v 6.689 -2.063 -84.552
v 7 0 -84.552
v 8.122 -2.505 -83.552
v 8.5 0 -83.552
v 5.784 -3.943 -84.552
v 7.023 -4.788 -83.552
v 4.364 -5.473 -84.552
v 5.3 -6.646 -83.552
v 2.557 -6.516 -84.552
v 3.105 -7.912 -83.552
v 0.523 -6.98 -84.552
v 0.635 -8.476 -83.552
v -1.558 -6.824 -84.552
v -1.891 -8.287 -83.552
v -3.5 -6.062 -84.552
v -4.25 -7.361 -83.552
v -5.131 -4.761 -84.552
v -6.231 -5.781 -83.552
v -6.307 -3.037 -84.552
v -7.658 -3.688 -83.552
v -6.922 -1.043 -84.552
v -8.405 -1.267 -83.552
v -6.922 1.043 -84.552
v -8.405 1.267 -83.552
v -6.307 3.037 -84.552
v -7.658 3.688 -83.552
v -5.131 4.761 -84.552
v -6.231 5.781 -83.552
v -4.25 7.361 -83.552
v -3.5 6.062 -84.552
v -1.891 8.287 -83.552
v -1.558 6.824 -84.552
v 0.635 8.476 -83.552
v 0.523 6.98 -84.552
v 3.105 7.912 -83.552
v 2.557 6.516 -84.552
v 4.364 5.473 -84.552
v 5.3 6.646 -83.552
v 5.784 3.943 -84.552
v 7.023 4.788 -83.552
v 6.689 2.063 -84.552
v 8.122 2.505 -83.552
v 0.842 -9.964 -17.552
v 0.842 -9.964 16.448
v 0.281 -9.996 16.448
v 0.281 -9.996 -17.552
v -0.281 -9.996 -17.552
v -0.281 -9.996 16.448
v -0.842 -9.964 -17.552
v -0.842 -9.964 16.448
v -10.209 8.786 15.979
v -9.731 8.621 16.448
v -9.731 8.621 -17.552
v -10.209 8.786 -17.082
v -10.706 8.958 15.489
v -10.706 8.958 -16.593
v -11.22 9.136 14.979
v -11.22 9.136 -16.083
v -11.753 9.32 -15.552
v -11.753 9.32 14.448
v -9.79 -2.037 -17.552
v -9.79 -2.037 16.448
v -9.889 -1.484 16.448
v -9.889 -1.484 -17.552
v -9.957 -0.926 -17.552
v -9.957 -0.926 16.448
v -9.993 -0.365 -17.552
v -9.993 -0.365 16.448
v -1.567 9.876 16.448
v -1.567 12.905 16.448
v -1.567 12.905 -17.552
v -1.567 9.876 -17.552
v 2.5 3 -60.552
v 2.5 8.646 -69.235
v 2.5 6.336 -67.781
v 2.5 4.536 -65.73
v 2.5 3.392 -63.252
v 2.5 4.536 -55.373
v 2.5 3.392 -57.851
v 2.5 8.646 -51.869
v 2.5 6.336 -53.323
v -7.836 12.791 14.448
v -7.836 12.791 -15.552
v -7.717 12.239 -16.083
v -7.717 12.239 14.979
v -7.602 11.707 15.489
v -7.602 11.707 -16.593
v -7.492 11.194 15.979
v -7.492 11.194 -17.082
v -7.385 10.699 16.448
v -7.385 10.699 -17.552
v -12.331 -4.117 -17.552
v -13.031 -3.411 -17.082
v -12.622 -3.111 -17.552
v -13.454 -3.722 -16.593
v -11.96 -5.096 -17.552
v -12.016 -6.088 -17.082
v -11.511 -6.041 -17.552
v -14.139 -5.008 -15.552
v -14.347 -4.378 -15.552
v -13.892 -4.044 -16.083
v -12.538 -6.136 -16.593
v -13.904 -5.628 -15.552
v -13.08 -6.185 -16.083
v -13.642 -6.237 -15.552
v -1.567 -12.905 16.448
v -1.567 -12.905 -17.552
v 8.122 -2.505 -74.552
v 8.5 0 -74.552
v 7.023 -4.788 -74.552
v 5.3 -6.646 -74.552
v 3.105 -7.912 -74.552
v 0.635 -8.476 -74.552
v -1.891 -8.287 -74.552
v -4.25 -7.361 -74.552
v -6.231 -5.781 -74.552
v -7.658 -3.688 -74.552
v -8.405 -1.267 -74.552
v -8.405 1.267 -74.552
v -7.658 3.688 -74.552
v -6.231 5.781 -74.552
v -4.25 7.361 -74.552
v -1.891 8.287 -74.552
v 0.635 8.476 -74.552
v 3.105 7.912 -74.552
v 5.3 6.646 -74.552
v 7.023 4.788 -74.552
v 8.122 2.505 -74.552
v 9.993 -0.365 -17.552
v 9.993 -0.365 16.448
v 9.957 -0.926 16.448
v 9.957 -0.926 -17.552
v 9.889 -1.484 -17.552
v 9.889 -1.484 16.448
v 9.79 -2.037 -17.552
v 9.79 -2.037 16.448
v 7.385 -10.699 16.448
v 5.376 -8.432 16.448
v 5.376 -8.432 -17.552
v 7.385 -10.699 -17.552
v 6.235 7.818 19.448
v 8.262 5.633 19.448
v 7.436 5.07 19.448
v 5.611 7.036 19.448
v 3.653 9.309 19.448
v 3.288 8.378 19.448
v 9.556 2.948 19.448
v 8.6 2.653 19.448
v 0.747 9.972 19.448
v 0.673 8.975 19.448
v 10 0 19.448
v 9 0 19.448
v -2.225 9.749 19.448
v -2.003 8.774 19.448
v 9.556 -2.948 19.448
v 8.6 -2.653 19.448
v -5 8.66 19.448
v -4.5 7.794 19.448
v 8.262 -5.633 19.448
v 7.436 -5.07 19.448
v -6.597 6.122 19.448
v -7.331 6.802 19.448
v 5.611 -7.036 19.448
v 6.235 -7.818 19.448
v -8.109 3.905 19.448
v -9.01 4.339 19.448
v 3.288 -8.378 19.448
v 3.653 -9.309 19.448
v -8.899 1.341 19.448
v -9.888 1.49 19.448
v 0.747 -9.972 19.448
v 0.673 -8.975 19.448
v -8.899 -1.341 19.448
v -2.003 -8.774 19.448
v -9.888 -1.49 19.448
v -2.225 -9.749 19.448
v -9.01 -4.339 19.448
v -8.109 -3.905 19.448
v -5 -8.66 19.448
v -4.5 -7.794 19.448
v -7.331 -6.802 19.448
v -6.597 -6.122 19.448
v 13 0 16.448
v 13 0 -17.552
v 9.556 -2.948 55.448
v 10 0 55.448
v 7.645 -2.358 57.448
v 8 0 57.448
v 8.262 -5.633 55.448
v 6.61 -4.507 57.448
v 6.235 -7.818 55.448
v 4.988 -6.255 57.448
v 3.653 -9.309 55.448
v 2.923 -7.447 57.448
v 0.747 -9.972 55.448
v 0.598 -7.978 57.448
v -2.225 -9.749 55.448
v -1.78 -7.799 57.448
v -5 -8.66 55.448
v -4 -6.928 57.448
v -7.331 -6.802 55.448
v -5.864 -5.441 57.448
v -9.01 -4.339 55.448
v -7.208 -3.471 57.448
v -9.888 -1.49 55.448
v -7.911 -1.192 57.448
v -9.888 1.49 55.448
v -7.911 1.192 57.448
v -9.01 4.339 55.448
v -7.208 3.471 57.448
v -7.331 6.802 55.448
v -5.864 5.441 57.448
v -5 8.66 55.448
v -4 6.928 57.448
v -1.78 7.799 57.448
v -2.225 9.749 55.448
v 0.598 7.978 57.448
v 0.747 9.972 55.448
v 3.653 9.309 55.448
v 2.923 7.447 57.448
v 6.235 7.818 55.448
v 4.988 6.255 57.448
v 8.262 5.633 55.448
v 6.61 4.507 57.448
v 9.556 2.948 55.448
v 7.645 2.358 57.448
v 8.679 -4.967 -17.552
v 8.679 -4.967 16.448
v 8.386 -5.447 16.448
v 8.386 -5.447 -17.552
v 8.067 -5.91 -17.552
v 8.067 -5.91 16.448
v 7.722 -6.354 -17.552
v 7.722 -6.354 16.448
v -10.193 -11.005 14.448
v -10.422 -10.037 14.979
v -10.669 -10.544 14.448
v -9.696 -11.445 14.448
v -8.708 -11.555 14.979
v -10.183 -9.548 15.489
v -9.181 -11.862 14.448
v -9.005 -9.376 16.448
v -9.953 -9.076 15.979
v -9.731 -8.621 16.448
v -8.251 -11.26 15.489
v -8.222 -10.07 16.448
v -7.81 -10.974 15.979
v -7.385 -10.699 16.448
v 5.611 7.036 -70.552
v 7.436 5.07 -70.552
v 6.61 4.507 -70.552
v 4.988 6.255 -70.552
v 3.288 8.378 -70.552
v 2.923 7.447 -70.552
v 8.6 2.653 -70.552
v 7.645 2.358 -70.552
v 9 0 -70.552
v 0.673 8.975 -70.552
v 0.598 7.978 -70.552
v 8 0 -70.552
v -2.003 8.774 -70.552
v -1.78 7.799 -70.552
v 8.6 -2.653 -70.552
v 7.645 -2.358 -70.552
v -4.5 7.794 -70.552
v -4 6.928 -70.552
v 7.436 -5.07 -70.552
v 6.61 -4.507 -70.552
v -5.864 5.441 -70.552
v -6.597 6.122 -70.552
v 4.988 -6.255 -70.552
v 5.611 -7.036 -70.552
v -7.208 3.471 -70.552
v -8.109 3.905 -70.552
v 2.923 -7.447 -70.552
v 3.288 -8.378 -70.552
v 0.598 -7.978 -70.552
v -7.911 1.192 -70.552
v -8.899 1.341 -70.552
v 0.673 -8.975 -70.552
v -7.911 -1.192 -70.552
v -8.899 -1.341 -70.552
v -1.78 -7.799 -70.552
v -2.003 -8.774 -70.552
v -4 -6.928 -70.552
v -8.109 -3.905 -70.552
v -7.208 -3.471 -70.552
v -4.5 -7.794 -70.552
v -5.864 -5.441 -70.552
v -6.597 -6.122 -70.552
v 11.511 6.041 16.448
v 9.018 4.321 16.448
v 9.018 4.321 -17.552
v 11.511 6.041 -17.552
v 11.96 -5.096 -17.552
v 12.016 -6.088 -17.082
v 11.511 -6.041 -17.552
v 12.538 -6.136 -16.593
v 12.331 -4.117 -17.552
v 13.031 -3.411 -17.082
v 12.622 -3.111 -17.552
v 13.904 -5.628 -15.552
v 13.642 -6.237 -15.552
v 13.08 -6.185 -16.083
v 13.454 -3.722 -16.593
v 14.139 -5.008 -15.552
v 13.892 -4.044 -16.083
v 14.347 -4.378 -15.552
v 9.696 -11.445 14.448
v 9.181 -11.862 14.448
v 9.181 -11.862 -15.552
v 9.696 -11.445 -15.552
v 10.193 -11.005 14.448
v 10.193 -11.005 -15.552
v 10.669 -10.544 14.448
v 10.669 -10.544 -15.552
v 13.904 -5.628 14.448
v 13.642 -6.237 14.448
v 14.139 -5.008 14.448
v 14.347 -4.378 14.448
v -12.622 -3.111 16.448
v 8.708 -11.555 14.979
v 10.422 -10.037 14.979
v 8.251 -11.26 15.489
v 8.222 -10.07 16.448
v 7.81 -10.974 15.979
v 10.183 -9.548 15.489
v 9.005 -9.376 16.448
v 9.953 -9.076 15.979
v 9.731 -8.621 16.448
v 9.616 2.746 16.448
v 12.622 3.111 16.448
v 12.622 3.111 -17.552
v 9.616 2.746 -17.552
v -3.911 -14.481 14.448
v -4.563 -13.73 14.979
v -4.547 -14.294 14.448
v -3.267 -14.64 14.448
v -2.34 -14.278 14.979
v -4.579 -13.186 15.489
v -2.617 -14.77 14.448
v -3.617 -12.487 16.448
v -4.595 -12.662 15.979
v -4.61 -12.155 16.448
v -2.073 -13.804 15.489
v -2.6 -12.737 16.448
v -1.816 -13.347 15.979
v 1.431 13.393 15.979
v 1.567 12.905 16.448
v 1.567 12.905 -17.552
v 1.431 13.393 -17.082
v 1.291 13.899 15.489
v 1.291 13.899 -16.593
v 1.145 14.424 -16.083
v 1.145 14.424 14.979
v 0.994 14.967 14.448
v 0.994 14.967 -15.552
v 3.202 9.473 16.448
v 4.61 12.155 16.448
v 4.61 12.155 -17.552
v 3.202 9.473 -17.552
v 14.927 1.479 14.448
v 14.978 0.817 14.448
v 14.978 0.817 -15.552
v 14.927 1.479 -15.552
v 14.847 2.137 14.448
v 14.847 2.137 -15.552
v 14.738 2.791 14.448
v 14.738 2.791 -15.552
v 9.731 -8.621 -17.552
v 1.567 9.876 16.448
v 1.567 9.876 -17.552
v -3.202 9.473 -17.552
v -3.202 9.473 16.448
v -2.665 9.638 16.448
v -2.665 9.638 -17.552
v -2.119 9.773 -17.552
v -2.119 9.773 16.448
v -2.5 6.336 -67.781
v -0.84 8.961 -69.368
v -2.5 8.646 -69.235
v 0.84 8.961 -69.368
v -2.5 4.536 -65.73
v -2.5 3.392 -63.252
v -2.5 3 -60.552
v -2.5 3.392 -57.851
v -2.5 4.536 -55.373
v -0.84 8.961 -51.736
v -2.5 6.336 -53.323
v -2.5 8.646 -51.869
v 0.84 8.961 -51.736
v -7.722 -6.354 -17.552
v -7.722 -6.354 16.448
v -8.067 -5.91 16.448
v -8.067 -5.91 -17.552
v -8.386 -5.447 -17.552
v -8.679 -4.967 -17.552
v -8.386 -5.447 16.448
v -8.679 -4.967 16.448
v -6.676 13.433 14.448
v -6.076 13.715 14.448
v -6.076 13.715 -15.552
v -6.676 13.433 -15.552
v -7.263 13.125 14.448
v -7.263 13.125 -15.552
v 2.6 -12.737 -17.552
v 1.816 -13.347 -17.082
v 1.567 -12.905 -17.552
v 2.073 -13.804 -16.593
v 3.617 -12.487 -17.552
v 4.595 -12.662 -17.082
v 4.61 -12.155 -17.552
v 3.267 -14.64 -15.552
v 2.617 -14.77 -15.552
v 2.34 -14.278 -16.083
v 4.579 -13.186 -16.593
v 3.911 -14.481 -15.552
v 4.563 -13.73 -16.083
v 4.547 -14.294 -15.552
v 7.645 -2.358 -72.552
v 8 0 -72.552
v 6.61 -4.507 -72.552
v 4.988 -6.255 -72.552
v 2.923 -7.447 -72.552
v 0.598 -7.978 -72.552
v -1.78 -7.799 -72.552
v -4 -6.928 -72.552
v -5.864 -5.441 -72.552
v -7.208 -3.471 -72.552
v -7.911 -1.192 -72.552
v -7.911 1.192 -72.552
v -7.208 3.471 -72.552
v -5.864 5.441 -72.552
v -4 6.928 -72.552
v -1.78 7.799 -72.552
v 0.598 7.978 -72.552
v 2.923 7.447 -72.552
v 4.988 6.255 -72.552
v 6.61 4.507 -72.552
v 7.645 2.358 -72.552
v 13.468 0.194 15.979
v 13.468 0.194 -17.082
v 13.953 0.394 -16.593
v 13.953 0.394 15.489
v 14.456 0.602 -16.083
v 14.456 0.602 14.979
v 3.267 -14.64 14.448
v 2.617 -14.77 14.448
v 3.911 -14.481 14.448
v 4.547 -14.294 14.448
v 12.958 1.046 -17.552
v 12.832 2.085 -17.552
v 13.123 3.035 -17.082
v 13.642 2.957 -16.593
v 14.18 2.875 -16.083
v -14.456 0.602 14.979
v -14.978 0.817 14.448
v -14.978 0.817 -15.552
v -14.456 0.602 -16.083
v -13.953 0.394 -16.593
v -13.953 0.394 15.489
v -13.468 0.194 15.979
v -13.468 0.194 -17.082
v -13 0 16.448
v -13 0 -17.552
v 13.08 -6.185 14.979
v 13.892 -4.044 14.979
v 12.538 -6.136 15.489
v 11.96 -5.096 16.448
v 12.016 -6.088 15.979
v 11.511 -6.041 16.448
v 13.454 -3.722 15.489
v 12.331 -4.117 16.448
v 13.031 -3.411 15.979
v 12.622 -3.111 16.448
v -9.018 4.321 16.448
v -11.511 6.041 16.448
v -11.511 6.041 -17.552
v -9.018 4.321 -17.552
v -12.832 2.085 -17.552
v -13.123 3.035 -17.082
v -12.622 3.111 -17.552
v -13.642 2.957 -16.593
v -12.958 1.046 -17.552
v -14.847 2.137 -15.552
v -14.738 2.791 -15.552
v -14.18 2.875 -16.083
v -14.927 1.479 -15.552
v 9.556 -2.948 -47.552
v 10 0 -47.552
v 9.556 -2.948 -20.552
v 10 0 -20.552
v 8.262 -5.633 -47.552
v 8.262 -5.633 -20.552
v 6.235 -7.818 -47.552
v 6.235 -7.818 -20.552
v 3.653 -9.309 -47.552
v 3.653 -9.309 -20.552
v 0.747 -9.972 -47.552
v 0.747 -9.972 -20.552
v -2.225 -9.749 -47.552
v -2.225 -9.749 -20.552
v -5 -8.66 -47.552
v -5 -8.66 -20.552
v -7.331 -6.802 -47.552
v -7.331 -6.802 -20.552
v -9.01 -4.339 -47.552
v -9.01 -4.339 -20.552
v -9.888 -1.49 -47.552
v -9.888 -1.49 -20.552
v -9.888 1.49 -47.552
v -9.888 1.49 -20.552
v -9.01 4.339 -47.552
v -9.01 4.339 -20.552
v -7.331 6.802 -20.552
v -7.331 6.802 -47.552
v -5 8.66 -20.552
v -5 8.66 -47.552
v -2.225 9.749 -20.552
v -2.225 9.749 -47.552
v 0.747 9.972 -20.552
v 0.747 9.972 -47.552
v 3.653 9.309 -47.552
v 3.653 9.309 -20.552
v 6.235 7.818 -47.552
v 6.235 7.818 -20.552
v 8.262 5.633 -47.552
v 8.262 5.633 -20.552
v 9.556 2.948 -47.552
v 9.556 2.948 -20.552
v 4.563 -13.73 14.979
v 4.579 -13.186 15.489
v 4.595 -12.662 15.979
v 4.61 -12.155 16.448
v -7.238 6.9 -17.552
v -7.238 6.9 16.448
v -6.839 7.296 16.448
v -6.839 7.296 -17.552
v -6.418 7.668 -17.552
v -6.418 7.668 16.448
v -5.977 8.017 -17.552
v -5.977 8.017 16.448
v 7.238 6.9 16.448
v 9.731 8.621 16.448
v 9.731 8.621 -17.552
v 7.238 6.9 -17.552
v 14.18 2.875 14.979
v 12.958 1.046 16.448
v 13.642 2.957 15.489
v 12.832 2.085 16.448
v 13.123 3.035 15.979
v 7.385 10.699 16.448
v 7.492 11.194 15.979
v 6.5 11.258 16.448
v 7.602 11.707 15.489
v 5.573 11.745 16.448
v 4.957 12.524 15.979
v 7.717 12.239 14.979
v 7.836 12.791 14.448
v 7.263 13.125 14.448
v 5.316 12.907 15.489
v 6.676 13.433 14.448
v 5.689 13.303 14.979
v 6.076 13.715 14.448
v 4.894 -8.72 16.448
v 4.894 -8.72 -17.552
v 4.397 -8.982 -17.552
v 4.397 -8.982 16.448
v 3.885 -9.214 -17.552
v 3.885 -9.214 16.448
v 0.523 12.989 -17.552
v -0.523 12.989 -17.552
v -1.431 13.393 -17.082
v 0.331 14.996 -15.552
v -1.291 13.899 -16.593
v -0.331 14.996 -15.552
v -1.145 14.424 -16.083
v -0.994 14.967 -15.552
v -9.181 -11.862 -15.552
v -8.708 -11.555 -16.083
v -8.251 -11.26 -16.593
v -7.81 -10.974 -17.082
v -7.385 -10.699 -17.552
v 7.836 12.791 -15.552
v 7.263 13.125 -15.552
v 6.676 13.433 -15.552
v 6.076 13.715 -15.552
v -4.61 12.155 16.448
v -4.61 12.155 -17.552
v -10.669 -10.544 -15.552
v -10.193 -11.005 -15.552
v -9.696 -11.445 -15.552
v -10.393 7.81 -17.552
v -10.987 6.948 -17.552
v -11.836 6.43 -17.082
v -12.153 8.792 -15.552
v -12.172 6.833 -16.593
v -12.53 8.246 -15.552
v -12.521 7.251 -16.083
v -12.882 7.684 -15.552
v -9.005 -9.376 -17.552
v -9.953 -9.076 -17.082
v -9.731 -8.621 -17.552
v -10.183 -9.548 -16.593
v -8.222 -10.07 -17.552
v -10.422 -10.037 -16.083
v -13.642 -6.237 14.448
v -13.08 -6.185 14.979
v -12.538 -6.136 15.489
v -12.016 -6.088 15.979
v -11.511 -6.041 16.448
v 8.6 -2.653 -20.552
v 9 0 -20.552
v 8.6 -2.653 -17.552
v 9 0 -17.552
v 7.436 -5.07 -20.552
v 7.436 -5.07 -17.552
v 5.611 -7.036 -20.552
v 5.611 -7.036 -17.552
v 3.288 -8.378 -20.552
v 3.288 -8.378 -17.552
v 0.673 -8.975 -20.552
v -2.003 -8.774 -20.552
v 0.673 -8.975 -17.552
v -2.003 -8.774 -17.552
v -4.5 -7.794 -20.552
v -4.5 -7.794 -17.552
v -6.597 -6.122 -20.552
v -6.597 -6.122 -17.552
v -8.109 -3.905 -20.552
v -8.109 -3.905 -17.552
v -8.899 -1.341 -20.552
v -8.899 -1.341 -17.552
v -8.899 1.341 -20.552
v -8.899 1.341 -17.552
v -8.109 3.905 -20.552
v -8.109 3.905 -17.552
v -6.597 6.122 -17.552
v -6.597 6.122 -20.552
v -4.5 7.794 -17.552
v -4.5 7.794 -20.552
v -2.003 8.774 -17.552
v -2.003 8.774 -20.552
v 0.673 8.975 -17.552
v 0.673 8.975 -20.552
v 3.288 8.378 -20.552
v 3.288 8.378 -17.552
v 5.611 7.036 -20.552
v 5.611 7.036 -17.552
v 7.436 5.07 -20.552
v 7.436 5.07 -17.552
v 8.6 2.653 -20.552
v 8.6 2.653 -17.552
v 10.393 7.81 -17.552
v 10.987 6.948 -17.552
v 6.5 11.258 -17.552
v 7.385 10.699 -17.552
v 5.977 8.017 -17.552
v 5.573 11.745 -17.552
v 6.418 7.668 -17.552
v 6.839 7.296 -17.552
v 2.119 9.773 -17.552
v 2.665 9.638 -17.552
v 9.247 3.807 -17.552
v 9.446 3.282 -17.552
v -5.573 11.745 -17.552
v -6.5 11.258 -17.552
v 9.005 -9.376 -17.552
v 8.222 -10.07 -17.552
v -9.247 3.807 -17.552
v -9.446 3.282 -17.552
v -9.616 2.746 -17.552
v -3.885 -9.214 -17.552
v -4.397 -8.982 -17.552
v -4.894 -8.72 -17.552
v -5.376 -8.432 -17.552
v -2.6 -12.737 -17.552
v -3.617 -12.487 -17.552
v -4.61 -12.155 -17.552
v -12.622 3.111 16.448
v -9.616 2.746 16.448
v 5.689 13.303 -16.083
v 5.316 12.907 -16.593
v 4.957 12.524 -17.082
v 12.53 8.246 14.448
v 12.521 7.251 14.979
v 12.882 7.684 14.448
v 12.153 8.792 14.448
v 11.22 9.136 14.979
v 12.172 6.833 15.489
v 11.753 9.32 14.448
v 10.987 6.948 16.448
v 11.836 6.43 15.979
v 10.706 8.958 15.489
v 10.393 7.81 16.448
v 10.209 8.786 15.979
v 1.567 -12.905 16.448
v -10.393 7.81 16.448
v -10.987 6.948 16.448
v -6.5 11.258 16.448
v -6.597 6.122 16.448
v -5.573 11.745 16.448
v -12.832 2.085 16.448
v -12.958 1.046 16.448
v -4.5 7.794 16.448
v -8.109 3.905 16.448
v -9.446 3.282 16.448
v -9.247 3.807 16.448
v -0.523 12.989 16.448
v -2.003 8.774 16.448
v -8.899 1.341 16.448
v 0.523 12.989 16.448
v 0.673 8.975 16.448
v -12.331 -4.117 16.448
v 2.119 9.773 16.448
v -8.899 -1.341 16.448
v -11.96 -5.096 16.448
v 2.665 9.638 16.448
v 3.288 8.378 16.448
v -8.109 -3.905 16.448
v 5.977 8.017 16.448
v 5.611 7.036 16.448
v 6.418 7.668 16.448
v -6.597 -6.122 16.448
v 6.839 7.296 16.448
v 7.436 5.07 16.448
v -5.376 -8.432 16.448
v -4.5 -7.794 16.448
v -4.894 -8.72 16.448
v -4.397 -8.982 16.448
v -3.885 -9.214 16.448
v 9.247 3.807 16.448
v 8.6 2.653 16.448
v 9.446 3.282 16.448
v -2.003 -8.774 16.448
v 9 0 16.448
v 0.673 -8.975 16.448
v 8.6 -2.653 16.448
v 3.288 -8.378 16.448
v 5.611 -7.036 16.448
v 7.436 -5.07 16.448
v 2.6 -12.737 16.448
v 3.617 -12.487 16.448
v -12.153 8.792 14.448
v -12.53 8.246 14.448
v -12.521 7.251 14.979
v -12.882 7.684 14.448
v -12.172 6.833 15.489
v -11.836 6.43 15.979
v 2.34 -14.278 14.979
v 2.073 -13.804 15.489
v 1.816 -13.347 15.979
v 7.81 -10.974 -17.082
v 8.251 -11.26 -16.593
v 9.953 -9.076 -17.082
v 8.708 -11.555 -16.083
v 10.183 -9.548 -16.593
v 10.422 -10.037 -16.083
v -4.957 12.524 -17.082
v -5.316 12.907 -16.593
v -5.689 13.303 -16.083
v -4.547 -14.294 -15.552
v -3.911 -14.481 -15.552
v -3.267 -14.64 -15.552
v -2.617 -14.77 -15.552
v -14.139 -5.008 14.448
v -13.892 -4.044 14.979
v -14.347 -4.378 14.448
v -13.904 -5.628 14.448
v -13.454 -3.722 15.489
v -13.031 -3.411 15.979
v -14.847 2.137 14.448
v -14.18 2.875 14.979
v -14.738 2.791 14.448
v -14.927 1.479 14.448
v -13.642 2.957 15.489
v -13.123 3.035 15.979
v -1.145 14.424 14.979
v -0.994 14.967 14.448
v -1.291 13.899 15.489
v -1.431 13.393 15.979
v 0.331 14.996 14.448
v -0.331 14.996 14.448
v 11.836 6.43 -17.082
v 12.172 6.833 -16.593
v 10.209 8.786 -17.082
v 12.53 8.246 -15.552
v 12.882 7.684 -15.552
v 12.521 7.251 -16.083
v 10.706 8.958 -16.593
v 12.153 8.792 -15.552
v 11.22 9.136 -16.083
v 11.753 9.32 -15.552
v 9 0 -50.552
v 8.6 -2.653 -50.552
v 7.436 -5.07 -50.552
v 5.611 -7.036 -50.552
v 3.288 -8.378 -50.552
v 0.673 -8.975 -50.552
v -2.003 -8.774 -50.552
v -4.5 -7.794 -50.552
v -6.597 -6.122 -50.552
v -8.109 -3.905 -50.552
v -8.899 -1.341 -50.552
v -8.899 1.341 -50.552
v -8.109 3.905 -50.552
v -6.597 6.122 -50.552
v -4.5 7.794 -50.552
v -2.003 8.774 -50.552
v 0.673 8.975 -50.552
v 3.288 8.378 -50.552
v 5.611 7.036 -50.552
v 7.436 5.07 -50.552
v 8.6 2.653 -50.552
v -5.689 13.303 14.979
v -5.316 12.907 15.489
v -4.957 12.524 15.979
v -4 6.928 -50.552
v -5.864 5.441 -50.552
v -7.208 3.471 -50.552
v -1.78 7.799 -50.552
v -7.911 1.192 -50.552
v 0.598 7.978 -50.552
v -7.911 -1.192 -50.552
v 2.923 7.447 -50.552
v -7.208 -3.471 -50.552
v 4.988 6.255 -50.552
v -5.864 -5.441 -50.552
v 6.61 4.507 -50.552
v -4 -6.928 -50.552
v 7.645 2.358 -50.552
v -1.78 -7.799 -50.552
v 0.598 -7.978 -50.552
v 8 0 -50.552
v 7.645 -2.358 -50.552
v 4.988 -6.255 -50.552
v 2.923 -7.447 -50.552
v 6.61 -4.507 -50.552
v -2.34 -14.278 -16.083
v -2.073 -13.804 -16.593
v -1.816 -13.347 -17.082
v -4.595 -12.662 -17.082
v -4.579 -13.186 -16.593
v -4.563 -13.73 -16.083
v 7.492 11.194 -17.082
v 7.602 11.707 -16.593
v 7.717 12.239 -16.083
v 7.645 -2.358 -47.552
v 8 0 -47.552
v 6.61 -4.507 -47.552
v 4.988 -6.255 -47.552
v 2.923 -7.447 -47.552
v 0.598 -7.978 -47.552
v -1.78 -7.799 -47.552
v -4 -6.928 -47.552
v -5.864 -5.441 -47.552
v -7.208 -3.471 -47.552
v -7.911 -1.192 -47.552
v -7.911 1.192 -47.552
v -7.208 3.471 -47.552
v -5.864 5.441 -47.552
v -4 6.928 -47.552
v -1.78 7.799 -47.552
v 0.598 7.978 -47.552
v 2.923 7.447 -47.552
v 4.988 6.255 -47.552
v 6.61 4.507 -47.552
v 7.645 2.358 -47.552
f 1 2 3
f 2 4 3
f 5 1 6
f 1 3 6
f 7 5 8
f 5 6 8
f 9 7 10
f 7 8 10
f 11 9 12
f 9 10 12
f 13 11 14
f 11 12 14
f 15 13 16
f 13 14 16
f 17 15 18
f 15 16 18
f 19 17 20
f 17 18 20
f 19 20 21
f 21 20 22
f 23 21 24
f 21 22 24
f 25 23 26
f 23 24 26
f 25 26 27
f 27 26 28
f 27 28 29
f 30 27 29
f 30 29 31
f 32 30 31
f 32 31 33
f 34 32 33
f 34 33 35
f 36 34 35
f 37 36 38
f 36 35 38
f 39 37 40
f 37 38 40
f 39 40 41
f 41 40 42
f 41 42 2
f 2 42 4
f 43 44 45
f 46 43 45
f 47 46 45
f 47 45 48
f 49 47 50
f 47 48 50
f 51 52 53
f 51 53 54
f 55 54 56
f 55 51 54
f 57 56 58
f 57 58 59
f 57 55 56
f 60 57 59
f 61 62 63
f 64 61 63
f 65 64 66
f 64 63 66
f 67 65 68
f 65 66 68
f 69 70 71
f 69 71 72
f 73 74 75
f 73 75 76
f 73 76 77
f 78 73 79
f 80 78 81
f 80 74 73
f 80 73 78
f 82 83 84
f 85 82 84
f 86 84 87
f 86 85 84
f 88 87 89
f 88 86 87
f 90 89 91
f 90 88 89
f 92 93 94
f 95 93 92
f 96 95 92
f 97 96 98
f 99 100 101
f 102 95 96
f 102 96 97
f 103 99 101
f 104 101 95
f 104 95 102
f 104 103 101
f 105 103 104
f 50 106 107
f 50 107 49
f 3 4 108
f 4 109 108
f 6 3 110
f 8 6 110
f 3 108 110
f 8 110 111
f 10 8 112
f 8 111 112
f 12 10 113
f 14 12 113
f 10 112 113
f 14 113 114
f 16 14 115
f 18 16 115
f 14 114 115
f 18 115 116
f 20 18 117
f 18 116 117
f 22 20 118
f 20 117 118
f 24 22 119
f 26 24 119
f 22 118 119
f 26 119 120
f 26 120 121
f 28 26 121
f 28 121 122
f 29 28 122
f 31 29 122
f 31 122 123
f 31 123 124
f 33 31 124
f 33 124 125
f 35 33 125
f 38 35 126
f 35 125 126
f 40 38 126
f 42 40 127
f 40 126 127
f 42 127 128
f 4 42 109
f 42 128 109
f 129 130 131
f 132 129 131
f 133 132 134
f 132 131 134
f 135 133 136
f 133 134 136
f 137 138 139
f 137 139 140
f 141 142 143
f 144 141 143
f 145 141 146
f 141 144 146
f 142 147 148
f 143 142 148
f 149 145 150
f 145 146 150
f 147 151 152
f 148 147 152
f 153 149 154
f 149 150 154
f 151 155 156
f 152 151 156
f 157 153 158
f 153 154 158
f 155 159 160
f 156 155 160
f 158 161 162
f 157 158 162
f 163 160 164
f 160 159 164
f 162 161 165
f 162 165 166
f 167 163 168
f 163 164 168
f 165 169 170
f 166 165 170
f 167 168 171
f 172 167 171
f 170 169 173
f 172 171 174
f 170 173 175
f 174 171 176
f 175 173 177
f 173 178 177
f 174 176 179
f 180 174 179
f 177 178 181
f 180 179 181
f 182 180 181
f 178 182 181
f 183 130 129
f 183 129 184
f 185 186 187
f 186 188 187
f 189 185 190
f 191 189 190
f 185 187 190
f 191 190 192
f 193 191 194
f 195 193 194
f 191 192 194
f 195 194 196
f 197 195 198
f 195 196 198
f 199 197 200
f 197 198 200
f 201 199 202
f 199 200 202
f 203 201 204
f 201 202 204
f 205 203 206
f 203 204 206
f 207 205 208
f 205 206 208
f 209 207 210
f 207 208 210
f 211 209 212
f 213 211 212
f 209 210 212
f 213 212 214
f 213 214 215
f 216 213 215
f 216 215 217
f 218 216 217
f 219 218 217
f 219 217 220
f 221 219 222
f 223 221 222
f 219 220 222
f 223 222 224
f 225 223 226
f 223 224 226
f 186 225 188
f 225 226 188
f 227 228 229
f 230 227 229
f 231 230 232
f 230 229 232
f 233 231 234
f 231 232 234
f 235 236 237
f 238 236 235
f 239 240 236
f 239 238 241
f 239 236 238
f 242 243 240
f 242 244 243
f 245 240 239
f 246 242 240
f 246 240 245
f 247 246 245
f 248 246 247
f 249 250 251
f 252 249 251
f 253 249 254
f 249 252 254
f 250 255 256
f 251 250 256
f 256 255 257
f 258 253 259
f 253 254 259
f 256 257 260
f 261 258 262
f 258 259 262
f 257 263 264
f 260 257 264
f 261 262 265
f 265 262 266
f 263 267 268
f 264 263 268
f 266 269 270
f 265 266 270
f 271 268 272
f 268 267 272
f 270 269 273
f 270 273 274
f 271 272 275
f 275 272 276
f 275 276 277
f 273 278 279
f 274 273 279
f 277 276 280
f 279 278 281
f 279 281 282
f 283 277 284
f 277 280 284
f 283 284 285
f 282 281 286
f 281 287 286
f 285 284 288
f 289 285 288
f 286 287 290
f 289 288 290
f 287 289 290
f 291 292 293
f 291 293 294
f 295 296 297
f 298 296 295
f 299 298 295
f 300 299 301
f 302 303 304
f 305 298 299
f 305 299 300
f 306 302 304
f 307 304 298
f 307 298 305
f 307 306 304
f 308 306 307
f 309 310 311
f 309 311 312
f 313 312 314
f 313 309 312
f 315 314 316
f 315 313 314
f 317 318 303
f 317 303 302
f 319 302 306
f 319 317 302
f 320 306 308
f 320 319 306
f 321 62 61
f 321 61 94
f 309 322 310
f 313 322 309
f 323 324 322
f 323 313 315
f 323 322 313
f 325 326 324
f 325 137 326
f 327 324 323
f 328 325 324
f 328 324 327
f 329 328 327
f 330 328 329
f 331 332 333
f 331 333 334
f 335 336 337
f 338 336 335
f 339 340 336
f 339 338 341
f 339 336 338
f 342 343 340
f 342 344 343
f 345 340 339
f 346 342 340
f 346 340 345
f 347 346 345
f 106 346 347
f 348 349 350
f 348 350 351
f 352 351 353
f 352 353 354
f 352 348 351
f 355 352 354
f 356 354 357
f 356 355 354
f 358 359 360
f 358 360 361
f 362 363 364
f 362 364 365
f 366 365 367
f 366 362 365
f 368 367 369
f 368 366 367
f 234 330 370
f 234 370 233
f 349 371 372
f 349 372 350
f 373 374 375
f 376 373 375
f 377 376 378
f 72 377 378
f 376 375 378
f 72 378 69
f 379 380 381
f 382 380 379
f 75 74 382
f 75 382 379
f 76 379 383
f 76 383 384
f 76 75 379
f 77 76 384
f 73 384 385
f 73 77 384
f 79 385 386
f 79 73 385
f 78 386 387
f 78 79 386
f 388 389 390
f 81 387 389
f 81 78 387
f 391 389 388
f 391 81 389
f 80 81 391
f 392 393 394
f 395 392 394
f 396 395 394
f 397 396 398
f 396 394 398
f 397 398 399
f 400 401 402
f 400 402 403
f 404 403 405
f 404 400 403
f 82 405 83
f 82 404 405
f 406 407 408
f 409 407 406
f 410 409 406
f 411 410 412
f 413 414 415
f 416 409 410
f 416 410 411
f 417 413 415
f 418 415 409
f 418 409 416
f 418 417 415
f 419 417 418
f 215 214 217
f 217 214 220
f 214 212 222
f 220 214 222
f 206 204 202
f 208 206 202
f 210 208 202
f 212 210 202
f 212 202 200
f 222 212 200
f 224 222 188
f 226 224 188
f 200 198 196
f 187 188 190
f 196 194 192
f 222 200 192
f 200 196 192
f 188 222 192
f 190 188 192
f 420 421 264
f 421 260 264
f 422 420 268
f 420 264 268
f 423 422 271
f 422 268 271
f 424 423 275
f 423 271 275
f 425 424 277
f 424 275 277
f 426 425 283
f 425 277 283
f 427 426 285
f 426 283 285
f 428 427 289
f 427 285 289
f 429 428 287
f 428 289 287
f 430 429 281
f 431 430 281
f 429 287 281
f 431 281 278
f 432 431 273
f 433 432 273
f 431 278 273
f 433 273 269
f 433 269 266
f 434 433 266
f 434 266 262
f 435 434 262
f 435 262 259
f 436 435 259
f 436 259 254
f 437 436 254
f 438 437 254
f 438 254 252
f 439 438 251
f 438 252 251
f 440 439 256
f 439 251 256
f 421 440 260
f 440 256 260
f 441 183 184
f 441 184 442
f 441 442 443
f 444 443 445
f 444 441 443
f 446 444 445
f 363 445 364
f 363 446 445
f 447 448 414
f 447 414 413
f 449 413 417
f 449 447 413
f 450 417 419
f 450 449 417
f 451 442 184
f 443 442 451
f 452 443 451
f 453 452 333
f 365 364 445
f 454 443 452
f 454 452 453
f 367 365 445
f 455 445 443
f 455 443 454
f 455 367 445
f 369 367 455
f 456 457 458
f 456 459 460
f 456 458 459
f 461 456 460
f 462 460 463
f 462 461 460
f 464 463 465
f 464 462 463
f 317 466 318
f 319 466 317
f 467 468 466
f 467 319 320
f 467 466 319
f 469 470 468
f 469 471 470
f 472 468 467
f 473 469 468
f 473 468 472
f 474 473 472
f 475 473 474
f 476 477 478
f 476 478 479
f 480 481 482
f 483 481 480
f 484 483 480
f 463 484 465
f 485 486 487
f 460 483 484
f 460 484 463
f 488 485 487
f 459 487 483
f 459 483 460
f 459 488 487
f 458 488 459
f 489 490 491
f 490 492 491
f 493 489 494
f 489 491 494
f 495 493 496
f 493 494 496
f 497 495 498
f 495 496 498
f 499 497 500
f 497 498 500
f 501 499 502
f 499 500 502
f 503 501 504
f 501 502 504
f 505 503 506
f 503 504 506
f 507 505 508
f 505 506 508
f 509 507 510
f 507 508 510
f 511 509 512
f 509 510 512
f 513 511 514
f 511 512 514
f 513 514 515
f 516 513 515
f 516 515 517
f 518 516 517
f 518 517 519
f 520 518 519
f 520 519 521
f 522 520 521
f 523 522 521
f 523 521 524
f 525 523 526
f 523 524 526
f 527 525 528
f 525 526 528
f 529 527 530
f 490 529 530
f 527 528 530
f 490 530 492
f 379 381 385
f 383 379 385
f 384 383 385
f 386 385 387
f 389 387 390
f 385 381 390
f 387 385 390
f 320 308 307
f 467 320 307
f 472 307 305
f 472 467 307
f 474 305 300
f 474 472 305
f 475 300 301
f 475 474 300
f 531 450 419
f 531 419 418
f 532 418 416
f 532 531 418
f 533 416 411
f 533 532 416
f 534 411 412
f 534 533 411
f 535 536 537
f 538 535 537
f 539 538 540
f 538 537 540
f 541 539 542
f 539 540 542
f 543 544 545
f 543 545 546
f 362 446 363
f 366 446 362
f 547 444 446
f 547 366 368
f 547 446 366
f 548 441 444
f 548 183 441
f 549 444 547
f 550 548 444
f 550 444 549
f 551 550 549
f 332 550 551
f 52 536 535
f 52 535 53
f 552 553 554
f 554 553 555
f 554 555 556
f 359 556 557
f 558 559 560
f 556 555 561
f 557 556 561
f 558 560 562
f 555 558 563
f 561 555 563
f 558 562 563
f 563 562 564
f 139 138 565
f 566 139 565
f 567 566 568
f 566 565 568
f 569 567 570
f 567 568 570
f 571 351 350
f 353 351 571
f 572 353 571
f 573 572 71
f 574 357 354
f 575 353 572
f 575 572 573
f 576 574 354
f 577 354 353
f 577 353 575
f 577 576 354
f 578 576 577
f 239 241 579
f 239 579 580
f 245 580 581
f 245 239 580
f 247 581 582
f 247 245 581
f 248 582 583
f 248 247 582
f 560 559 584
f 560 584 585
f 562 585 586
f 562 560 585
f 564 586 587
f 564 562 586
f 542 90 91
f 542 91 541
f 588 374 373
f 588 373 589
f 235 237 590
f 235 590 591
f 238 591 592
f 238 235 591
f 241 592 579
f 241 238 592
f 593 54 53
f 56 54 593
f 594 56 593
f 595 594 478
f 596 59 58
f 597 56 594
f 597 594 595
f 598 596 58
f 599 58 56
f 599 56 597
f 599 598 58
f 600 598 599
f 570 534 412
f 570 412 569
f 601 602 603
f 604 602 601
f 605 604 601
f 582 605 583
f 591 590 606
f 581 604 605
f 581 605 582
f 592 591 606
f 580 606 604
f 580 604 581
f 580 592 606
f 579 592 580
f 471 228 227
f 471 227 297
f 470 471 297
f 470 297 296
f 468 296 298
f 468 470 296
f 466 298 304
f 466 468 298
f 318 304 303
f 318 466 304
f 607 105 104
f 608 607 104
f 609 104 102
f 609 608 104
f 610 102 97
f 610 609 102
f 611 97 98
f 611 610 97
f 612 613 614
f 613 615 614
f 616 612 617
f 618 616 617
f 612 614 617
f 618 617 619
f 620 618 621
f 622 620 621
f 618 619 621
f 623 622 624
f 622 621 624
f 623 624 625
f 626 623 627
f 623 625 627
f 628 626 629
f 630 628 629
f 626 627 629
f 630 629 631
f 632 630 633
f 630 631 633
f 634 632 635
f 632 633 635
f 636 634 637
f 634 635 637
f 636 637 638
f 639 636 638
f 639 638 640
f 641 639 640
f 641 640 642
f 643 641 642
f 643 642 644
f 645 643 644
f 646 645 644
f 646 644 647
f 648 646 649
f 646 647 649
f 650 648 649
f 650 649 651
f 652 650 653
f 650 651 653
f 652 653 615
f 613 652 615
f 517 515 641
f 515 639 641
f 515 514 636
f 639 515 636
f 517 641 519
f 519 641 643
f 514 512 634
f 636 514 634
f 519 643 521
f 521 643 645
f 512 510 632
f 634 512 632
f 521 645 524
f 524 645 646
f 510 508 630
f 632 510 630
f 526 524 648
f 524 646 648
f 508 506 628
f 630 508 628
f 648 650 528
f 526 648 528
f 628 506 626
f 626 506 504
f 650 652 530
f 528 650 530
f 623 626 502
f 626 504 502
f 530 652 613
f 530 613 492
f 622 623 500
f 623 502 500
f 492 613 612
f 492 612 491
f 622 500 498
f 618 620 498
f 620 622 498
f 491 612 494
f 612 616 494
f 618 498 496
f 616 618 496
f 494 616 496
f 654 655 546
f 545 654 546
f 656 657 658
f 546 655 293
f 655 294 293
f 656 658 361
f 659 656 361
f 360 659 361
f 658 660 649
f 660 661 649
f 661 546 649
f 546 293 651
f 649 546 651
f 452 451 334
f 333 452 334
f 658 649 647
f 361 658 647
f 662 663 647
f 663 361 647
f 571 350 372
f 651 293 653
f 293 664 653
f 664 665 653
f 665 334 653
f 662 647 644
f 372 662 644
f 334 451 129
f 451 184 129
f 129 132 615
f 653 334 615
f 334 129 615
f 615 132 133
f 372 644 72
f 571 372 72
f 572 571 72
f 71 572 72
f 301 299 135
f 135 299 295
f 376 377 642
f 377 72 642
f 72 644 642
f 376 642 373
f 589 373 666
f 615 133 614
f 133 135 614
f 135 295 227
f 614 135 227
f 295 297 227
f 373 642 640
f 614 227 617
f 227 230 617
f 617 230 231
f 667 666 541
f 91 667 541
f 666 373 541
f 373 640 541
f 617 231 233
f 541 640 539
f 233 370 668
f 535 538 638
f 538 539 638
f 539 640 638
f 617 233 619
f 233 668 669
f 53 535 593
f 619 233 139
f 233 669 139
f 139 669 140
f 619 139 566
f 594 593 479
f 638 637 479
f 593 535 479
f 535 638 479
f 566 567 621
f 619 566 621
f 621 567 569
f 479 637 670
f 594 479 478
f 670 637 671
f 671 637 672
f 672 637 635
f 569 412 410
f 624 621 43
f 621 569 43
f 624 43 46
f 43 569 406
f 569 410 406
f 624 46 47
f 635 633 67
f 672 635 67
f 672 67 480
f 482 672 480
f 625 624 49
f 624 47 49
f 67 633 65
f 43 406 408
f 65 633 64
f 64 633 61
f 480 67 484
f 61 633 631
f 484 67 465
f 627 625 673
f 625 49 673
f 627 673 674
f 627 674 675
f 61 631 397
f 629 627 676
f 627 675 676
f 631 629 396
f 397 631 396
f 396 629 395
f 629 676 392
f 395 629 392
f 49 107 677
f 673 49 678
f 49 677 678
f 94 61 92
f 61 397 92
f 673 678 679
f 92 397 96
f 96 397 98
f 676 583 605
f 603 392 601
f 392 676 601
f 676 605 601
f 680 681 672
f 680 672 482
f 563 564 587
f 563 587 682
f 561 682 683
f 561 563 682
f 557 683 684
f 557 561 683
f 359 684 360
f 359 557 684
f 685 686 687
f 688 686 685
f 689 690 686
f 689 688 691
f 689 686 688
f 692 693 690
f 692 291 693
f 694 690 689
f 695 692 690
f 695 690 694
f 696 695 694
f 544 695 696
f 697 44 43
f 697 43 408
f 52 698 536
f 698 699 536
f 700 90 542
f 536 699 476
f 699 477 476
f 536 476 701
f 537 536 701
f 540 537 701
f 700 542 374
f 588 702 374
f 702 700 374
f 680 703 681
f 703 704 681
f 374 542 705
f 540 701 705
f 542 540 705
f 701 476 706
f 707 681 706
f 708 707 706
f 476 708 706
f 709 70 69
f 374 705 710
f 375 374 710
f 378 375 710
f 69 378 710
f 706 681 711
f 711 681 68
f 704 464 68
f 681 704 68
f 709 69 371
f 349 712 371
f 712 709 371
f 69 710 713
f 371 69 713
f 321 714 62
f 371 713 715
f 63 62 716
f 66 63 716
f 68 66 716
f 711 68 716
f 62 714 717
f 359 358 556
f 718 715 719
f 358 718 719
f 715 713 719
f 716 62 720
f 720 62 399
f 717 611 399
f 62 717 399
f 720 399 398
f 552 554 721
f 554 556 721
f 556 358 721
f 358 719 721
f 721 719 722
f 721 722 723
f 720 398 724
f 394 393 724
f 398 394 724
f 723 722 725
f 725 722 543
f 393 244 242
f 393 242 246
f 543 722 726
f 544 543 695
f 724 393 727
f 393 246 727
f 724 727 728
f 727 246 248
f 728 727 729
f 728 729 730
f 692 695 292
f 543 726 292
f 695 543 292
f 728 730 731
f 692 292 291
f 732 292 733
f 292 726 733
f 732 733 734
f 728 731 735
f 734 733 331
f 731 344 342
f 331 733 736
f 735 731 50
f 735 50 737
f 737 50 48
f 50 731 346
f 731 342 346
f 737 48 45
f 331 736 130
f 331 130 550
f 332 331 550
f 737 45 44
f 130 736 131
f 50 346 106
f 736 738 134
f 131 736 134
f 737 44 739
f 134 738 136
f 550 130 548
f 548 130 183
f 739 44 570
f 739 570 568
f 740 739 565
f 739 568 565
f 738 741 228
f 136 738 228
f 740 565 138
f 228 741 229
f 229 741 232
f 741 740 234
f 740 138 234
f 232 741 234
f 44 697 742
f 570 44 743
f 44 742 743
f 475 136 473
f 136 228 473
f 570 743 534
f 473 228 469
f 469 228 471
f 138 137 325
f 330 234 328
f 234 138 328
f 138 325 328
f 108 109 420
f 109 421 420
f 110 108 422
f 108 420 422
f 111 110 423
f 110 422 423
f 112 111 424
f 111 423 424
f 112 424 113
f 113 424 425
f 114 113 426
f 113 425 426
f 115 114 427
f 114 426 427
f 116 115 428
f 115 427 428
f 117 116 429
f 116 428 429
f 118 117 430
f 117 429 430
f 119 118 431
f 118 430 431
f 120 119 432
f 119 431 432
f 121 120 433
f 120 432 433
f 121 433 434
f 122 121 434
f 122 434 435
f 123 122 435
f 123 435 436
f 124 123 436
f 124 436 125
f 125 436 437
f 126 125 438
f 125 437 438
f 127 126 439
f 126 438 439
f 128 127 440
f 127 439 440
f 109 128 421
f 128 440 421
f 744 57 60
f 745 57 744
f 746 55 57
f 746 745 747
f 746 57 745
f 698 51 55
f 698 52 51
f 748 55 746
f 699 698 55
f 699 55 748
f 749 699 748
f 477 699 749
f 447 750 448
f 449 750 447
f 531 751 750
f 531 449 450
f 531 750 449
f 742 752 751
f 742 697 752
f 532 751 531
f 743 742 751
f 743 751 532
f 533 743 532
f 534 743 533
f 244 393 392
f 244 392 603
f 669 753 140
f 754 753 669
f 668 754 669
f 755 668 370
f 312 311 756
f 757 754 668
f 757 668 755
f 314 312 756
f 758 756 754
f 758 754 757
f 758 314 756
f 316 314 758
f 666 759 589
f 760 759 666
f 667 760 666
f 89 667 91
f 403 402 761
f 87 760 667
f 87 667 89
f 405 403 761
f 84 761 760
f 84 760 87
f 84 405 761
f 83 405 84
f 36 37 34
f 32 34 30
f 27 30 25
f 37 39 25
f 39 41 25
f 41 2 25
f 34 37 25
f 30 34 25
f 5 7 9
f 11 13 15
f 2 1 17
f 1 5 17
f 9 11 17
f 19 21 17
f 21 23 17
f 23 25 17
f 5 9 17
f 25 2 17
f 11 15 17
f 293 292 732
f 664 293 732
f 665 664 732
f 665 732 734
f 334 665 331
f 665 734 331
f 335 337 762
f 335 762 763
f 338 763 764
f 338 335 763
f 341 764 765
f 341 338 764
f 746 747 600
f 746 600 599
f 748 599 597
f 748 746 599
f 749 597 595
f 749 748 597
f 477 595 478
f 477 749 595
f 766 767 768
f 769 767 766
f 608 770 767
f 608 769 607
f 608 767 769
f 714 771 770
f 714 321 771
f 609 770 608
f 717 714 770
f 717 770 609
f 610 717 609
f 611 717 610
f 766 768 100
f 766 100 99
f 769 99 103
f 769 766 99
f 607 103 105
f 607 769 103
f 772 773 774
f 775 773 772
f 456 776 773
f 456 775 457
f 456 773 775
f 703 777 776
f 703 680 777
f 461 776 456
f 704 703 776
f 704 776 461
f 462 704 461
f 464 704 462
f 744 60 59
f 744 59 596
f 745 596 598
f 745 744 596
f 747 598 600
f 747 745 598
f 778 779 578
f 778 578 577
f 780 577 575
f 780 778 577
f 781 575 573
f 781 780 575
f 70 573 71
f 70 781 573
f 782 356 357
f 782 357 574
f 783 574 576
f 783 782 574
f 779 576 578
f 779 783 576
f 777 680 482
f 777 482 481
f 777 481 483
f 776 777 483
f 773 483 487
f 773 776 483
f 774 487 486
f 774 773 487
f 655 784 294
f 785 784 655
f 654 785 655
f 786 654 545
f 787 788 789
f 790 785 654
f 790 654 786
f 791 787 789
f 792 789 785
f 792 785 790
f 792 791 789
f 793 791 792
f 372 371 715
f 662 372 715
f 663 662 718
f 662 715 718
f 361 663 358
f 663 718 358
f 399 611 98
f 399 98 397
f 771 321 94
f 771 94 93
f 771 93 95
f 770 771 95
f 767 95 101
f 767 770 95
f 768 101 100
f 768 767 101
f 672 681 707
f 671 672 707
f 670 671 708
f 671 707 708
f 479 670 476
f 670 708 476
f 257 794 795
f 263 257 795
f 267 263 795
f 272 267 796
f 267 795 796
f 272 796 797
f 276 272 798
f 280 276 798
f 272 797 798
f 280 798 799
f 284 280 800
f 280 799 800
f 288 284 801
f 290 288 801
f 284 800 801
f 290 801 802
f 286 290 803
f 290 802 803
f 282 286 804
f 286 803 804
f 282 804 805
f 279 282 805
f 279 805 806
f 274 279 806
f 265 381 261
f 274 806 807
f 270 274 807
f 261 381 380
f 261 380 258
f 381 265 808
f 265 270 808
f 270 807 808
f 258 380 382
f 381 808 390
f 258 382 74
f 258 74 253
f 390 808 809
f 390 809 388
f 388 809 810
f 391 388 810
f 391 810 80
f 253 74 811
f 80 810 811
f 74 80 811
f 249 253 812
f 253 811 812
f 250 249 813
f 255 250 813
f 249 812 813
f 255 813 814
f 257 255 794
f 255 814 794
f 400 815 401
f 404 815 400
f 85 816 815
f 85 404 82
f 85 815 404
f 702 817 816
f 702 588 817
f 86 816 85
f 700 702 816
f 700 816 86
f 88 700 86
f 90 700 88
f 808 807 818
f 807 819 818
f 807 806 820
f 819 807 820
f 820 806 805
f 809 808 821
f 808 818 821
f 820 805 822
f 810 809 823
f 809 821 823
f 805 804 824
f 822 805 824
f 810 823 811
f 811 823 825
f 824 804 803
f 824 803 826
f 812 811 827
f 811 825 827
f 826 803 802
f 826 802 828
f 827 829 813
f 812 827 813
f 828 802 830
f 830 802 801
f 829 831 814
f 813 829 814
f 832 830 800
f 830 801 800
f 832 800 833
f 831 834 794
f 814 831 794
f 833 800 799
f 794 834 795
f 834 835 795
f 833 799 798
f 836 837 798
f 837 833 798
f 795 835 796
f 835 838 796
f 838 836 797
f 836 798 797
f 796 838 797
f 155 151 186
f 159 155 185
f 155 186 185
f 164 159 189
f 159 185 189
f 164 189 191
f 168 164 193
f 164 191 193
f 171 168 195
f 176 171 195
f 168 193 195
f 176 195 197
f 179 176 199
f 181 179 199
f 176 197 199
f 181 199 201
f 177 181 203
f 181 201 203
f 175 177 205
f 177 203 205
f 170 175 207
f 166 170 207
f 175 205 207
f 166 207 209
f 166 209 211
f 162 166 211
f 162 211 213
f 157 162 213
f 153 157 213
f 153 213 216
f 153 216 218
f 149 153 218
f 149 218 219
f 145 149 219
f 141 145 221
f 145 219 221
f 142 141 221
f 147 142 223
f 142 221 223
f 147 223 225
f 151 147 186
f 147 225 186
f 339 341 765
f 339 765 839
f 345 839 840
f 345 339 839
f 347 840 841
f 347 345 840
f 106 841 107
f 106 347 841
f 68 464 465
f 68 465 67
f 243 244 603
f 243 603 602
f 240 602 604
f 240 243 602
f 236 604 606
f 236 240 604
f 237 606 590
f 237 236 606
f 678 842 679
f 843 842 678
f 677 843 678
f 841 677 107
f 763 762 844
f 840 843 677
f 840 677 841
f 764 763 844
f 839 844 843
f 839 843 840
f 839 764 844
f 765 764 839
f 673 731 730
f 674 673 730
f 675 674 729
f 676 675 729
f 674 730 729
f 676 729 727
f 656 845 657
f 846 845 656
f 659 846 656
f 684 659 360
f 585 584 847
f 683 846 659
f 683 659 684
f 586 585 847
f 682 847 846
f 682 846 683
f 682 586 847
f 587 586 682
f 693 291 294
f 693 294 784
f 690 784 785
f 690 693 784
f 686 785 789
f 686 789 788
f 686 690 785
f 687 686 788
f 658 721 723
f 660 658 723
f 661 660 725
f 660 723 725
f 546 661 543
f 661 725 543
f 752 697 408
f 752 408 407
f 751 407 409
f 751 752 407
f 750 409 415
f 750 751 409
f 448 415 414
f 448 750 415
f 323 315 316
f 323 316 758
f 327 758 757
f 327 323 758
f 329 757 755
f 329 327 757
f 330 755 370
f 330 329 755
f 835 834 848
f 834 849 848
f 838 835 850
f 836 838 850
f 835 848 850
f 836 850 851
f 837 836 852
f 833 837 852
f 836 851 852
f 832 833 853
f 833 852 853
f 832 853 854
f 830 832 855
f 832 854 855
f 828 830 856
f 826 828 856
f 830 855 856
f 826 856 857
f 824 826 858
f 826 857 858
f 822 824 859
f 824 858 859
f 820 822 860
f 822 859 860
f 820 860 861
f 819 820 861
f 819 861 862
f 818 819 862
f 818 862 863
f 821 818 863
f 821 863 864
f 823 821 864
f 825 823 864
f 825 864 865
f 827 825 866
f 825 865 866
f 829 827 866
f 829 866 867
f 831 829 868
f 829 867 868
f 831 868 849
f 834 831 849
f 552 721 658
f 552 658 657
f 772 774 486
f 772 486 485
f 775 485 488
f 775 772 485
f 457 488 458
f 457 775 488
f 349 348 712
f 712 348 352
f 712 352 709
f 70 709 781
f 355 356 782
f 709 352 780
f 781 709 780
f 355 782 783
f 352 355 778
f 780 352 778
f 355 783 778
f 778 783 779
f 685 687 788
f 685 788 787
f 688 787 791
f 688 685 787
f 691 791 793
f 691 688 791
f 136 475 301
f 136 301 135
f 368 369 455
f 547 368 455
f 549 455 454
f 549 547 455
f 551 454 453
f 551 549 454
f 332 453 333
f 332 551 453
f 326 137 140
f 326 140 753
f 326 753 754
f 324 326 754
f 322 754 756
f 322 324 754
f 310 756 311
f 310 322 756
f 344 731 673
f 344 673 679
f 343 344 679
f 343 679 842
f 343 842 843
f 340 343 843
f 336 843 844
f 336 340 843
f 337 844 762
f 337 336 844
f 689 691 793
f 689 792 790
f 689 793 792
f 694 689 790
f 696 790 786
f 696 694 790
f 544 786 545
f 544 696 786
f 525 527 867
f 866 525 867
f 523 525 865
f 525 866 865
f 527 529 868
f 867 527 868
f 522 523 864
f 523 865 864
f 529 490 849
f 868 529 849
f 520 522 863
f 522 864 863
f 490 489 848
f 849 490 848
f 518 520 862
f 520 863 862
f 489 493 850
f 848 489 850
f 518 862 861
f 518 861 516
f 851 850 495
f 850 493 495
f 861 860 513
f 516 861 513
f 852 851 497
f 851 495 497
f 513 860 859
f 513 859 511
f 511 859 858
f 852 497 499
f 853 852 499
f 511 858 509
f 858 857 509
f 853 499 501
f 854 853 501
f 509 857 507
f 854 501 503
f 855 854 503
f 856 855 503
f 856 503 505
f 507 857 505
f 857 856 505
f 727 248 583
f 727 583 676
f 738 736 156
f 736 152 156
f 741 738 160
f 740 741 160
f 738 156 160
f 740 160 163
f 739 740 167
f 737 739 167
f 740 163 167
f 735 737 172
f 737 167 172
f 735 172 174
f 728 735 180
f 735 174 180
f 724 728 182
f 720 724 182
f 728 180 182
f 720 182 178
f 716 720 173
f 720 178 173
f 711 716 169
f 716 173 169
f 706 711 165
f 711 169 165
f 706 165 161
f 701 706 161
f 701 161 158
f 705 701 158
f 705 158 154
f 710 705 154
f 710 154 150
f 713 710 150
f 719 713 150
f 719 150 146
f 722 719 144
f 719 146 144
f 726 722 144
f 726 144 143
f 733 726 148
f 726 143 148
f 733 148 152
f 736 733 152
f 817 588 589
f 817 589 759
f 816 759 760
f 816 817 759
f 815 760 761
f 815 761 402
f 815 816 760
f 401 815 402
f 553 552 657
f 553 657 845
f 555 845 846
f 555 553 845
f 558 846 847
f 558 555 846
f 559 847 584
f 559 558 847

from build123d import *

# Parameters (mm, degrees)
EXTRUDE_START                        = 16
EXTRUDE_1_DEPTH                      = 34
CHAMFER_1_SIZE                       = 2
PATTERN_CIRCULAR_1_COUNT             = 13
CHAMFER_1_OF_PATTERN_CIRCULAR_1_SIZE = 2
CUT_EXTRUDE_1_DEPTH                  = 2.5


with BuildPart() as part:
    # Эскиз1 → Повернуть1 (revolve)
    with BuildSketch(Plane(origin=(0, 0, 0), x_dir=(0, 0, -1), z_dir=(1, 0, 0)), mode=Mode.PRIVATE) as revolve_1_sk:
        Polygon((84.551755586, 0), (84.551755586, 7), (83.551755586, 8.5), (74.551755586, 8.5), (72.551755586, 8), (70.551755586, 8), (70.551755586, 9), (50.551755586, 9), (50.551755586, 8), (47.551755586, 8), (47.551755586, 10), (20.551755586, 10), (20.551755586, 9), (17.551755586, 9), (17.551755586, 10), (-16.448244414, 10), (-16.448244414, 9), (-19.448244414, 9), (-19.448244414, 10), (-55.448244414, 10), (-57.448244414, 8), (-57.448244414, 0), align=None)
    revolve(revolve_1_sk.sketch.rotate(Axis((0, 0, 57.448244414), (0, 0, -1)), 90), axis=Axis((0, 0, 57.448244414), (0, 0, -1)))

    # Эскиз2 → Бобышка-Вытянуть1 (add)
    with BuildSketch(Plane.XY.offset(0.448244414).offset(EXTRUDE_START)):
        with BuildLine():
            Line((1.566976519, 9.876466199), (1.566976519, 12.905215403))
            Line((1.566976519, 12.905215403), (0.993843905, 14.967039597))
            ThreePointArc((0.993843905, 14.967039597), (0, 15), (-0.993843905, 14.967039597))
            Line((-0.993843905, 14.967039597), (-1.566976519, 12.905215403))
            Line((-1.566976519, 12.905215403), (-1.566976519, 9.876466199))
            ThreePointArc((-1.566976519, 9.876466199), (0, 10), (1.566976519, 9.876466199))
        make_face()
    extrude_1 = extrude(amount=-EXTRUDE_1_DEPTH)

    # Фаска1
    chamfer_1_edges = [part.edges().sort_by_distance(p)[0] for p in [
        (0, 15, 16.448244414),
        (0, 15, -17.551755586),
    ]]
    chamfer(chamfer_1_edges, length=CHAMFER_1_SIZE)

    # Круговой массив1: Бобышка-Вытянуть1 ×13 about axis
    pattern_circular_1_axis = Axis((0, 0, 0), (0, 0, 1))
    for i in range(1, PATTERN_CIRCULAR_1_COUNT):
        add(extrude_1.rotate(pattern_circular_1_axis, i * 360 / PATTERN_CIRCULAR_1_COUNT))

    # Фаска1 of Круговой массив1
    chamfer_1_of_pattern_circular_1_edges = [part.edges().sort_by_distance(p)[0] for p in [
        (-6.970847581, 13.281840385, 16.448244414),
        (-6.970847581, 13.281840385, -17.551755586),
        (-12.344757988, 8.520971201, 16.448244414),
        (-12.344757988, 8.520971201, -17.551755586),
        (-14.890633111, 1.808050204, 16.448244414),
        (-14.890633111, 1.808050204, -17.551755586),
        (-14.02524364, -5.319073306, 16.448244414),
        (-14.02524364, -5.319073306, -17.551755586),
        (-9.946839874, -11.227661223, 16.448244414),
        (-9.946839874, -11.227661223, -17.551755586),
        (-3.589734964, -14.564127261, 16.448244414),
        (-3.589734964, -14.564127261, -17.551755586),
        (3.589734964, -14.564127261, 16.448244414),
        (3.589734964, -14.564127261, -17.551755586),
        (9.946839874, -11.227661223, 16.448244414),
        (9.946839874, -11.227661223, -17.551755586),
        (14.02524364, -5.319073306, 16.448244414),
        (14.02524364, -5.319073306, -17.551755586),
        (14.890633111, 1.808050204, 16.448244414),
        (14.890633111, 1.808050204, -17.551755586),
        (12.344757988, 8.520971201, 16.448244414),
        (12.344757988, 8.520971201, -17.551755586),
        (6.970847581, 13.281840385, 16.448244414),
        (6.970847581, 13.281840385, -17.551755586),
    ]]
    chamfer(chamfer_1_of_pattern_circular_1_edges, length=CHAMFER_1_OF_PATTERN_CIRCULAR_1_SIZE)

    # Эскиз3 → Вырез-Вытянуть1 (cut, symmetric)
    with BuildSketch(Plane(origin=(0, 0, 0), x_dir=(0, 0, -1), z_dir=(1, 0, 0))):
        with BuildLine():
            Line((51.264667775, 10.5), (69.838843396, 10.5))
            ThreePointArc((69.838843396, 10.5), (60.551755586, 3), (51.264667775, 10.5))
        make_face()
    extrude(amount=CUT_EXTRUDE_1_DEPTH, both=True, mode=Mode.SUBTRACT)


solid = part.part
